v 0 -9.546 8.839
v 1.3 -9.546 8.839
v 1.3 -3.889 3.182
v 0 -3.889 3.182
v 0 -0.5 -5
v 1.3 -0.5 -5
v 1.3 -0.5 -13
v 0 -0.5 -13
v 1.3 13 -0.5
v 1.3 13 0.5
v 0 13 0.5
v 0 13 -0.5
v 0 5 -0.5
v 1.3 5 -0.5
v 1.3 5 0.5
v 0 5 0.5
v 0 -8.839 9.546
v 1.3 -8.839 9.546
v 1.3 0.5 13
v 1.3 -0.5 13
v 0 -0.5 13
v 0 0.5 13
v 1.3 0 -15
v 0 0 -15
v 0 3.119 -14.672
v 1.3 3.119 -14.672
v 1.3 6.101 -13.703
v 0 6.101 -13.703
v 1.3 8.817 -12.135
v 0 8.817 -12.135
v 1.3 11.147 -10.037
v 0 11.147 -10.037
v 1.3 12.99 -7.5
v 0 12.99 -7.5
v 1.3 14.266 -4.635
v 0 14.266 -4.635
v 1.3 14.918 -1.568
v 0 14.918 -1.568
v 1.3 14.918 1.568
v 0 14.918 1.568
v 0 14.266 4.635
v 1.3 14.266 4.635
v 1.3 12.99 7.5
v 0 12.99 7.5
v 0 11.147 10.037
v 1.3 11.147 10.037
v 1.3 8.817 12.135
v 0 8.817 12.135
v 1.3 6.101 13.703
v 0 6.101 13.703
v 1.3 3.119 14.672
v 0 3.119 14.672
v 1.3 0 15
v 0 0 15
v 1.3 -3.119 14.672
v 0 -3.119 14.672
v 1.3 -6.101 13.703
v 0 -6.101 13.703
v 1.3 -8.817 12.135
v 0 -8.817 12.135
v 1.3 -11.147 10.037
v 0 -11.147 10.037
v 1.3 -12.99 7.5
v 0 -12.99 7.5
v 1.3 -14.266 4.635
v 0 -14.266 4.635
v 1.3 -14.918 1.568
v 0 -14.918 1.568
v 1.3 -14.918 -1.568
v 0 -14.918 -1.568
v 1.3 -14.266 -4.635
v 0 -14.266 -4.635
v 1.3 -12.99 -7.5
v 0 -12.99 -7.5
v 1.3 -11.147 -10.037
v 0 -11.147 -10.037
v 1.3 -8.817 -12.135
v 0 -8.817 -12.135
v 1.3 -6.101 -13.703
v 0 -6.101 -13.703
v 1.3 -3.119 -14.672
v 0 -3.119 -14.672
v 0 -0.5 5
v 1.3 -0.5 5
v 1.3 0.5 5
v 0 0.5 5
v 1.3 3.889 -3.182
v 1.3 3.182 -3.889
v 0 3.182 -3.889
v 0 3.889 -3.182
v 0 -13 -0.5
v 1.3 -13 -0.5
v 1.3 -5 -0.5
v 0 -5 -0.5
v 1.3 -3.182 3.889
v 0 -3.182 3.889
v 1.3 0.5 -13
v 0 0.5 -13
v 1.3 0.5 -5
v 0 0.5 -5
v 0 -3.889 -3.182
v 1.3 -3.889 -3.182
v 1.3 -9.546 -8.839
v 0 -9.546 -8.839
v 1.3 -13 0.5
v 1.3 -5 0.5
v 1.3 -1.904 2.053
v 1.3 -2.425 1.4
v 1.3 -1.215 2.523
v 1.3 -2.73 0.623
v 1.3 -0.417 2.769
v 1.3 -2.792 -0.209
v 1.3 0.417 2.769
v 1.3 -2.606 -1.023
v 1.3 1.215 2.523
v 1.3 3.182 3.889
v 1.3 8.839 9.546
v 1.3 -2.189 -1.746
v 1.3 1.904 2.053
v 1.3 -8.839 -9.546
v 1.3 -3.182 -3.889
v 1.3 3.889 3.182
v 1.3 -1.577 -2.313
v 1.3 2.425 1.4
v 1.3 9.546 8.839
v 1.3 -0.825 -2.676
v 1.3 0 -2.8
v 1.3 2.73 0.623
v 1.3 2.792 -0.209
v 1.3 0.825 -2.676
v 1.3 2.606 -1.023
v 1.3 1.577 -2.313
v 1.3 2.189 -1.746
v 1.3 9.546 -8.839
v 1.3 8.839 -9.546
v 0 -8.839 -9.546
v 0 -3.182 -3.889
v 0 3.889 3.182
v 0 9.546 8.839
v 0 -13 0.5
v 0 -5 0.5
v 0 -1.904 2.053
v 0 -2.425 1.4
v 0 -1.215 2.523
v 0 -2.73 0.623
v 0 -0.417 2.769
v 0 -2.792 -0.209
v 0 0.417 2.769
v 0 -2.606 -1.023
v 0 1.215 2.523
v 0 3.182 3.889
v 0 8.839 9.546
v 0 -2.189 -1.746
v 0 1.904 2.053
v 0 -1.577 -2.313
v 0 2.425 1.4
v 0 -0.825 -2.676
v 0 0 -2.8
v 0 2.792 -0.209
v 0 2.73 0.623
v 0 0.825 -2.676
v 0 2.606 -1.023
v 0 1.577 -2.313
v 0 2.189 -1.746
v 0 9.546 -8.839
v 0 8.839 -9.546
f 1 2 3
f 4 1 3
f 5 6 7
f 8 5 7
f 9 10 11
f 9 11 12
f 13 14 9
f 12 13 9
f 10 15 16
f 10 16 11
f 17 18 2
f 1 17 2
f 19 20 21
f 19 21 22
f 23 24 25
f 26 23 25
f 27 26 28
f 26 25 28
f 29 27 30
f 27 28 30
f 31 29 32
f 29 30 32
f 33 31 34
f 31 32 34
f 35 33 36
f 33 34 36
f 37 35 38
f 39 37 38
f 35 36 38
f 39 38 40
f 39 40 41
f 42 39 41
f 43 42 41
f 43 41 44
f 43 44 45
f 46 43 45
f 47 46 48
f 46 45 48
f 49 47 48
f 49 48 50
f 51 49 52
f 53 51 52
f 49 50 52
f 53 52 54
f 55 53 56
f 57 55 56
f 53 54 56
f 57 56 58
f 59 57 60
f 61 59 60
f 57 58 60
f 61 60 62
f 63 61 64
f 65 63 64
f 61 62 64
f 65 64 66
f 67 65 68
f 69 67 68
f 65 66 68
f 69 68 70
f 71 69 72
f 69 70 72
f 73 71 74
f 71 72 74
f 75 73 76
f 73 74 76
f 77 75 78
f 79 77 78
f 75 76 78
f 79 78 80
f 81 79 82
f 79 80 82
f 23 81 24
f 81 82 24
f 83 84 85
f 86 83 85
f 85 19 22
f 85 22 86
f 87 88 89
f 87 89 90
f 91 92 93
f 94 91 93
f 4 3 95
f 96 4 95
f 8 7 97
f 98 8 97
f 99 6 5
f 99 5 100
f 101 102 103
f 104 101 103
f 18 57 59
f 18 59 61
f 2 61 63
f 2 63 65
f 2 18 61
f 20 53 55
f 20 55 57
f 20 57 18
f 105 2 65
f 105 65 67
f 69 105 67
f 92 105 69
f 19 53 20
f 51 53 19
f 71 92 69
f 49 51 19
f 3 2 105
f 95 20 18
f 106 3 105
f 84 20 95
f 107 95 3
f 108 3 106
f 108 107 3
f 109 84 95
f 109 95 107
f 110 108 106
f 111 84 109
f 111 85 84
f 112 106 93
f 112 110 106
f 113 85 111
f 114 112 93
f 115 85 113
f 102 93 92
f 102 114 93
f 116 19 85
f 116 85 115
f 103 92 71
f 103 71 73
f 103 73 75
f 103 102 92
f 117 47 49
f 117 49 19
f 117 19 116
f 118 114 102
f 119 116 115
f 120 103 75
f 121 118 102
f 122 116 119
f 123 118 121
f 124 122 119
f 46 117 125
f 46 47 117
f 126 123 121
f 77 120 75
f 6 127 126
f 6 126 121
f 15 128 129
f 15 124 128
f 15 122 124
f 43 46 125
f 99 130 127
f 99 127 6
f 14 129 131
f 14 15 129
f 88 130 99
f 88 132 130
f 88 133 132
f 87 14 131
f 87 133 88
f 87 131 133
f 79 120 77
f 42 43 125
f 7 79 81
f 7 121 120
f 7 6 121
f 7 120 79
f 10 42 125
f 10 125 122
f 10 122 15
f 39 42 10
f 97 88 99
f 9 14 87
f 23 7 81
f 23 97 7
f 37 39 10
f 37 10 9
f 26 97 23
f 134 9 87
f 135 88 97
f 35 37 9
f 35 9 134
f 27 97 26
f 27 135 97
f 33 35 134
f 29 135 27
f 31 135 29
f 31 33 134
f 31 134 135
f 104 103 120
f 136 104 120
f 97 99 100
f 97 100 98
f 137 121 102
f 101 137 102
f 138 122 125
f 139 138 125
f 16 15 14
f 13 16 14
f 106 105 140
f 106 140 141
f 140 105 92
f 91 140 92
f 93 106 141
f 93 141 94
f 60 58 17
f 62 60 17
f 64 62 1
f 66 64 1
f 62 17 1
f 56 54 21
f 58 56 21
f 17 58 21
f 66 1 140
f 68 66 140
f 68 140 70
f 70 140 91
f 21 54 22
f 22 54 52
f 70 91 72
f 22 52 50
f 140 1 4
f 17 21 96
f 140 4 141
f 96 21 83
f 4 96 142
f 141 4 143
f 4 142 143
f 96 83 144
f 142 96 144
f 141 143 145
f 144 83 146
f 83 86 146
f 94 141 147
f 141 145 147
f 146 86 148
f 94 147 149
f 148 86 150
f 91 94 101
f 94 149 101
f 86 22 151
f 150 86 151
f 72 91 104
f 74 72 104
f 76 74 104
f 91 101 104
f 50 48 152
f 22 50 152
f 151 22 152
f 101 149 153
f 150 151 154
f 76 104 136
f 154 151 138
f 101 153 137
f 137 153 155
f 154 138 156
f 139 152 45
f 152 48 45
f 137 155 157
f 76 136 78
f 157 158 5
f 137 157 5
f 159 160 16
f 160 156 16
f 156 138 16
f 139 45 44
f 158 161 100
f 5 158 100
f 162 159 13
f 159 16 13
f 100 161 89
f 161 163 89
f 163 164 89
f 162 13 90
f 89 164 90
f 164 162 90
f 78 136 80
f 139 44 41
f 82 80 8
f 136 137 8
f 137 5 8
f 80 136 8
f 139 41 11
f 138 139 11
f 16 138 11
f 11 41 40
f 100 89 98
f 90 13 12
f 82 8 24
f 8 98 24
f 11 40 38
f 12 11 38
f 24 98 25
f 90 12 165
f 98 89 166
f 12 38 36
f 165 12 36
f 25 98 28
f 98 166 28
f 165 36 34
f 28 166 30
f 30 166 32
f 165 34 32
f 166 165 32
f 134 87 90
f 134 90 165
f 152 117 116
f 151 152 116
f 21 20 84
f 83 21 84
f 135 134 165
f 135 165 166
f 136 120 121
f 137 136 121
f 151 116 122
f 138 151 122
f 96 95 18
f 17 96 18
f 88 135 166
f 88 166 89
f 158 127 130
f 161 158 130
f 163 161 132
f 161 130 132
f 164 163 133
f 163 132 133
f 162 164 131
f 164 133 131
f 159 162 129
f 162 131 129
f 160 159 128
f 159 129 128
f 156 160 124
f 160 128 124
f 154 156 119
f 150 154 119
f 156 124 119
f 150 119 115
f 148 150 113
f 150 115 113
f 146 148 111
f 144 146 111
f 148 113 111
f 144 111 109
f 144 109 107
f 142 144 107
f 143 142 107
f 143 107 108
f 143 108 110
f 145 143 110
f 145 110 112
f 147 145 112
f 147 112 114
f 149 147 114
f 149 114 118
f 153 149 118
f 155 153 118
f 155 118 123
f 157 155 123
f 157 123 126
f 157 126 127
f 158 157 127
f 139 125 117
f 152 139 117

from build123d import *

# Parameters (mm, degrees)
SKETCH1_R           = 15
BOSS_EXTRUDE1_DEPTH = 1.3
SKETCH2_R           = 2.8
CUT_EXTRUDE1_DEPTH  = 22.252999788
SKETCH3_W           = 1
SKETCH3_H           = 8
SKETCH3_W_2         = 8
SKETCH3_H_2         = 1
CUT_EXTRUDE2_DEPTH  = 22.252999788


with BuildPart() as part:
    # Sketch1 → Boss-Extrude1 (new body)
    with BuildSketch(Plane(origin=(0, 0, 0), x_dir=(0, 0, -1), z_dir=(1, 0, 0))):
        Circle(SKETCH1_R)
    extrude(amount=BOSS_EXTRUDE1_DEPTH)

    # Sketch2 → Cut-Extrude1 (cut, through all)
    with BuildSketch(Plane(origin=(1.3, 0, 0), x_dir=(0, 0, -1), z_dir=(1, 0, 0))):
        Circle(SKETCH2_R)
    extrude(amount=-CUT_EXTRUDE1_DEPTH, mode=Mode.SUBTRACT)

    # Sketch3 → Cut-Extrude2 (cut, through all)
    with BuildSketch(Plane(origin=(1.3, 0, 0), x_dir=(0, 0, -1), z_dir=(1, 0, 0))):
        Polygon((-8.838834765, -9.545941546), (-3.181980515, -3.889087297), (-3.889087297, -3.181980515), (-9.545941546, -8.838834765), align=None)
        Polygon((9.545941546, -8.838834765), (3.889087297, -3.181980515), (3.181980515, -3.889087297), (8.838834765, -9.545941546), align=None)
        Polygon((-9.545941546, 8.838834765), (-3.889087297, 3.181980515), (-3.181980515, 3.889087297), (-8.838834765, 9.545941546), align=None)
        Polygon((9.545941546, 8.838834765), (3.889087297, 3.181980515), (3.181980515, 3.889087297), (8.838834765, 9.545941546), align=None)
        with Locations((0, 9)):
            Rectangle(SKETCH3_W, SKETCH3_H)
        with Locations((9, 0)):
            Rectangle(SKETCH3_W_2, SKETCH3_H_2)
        with Locations((0, -9)):
            Rectangle(SKETCH3_W, SKETCH3_H)
        with Locations((-9, 0)):
            Rectangle(SKETCH3_W_2, SKETCH3_H_2)
    extrude(amount=-CUT_EXTRUDE2_DEPTH, mode=Mode.SUBTRACT)


solid = part.part
